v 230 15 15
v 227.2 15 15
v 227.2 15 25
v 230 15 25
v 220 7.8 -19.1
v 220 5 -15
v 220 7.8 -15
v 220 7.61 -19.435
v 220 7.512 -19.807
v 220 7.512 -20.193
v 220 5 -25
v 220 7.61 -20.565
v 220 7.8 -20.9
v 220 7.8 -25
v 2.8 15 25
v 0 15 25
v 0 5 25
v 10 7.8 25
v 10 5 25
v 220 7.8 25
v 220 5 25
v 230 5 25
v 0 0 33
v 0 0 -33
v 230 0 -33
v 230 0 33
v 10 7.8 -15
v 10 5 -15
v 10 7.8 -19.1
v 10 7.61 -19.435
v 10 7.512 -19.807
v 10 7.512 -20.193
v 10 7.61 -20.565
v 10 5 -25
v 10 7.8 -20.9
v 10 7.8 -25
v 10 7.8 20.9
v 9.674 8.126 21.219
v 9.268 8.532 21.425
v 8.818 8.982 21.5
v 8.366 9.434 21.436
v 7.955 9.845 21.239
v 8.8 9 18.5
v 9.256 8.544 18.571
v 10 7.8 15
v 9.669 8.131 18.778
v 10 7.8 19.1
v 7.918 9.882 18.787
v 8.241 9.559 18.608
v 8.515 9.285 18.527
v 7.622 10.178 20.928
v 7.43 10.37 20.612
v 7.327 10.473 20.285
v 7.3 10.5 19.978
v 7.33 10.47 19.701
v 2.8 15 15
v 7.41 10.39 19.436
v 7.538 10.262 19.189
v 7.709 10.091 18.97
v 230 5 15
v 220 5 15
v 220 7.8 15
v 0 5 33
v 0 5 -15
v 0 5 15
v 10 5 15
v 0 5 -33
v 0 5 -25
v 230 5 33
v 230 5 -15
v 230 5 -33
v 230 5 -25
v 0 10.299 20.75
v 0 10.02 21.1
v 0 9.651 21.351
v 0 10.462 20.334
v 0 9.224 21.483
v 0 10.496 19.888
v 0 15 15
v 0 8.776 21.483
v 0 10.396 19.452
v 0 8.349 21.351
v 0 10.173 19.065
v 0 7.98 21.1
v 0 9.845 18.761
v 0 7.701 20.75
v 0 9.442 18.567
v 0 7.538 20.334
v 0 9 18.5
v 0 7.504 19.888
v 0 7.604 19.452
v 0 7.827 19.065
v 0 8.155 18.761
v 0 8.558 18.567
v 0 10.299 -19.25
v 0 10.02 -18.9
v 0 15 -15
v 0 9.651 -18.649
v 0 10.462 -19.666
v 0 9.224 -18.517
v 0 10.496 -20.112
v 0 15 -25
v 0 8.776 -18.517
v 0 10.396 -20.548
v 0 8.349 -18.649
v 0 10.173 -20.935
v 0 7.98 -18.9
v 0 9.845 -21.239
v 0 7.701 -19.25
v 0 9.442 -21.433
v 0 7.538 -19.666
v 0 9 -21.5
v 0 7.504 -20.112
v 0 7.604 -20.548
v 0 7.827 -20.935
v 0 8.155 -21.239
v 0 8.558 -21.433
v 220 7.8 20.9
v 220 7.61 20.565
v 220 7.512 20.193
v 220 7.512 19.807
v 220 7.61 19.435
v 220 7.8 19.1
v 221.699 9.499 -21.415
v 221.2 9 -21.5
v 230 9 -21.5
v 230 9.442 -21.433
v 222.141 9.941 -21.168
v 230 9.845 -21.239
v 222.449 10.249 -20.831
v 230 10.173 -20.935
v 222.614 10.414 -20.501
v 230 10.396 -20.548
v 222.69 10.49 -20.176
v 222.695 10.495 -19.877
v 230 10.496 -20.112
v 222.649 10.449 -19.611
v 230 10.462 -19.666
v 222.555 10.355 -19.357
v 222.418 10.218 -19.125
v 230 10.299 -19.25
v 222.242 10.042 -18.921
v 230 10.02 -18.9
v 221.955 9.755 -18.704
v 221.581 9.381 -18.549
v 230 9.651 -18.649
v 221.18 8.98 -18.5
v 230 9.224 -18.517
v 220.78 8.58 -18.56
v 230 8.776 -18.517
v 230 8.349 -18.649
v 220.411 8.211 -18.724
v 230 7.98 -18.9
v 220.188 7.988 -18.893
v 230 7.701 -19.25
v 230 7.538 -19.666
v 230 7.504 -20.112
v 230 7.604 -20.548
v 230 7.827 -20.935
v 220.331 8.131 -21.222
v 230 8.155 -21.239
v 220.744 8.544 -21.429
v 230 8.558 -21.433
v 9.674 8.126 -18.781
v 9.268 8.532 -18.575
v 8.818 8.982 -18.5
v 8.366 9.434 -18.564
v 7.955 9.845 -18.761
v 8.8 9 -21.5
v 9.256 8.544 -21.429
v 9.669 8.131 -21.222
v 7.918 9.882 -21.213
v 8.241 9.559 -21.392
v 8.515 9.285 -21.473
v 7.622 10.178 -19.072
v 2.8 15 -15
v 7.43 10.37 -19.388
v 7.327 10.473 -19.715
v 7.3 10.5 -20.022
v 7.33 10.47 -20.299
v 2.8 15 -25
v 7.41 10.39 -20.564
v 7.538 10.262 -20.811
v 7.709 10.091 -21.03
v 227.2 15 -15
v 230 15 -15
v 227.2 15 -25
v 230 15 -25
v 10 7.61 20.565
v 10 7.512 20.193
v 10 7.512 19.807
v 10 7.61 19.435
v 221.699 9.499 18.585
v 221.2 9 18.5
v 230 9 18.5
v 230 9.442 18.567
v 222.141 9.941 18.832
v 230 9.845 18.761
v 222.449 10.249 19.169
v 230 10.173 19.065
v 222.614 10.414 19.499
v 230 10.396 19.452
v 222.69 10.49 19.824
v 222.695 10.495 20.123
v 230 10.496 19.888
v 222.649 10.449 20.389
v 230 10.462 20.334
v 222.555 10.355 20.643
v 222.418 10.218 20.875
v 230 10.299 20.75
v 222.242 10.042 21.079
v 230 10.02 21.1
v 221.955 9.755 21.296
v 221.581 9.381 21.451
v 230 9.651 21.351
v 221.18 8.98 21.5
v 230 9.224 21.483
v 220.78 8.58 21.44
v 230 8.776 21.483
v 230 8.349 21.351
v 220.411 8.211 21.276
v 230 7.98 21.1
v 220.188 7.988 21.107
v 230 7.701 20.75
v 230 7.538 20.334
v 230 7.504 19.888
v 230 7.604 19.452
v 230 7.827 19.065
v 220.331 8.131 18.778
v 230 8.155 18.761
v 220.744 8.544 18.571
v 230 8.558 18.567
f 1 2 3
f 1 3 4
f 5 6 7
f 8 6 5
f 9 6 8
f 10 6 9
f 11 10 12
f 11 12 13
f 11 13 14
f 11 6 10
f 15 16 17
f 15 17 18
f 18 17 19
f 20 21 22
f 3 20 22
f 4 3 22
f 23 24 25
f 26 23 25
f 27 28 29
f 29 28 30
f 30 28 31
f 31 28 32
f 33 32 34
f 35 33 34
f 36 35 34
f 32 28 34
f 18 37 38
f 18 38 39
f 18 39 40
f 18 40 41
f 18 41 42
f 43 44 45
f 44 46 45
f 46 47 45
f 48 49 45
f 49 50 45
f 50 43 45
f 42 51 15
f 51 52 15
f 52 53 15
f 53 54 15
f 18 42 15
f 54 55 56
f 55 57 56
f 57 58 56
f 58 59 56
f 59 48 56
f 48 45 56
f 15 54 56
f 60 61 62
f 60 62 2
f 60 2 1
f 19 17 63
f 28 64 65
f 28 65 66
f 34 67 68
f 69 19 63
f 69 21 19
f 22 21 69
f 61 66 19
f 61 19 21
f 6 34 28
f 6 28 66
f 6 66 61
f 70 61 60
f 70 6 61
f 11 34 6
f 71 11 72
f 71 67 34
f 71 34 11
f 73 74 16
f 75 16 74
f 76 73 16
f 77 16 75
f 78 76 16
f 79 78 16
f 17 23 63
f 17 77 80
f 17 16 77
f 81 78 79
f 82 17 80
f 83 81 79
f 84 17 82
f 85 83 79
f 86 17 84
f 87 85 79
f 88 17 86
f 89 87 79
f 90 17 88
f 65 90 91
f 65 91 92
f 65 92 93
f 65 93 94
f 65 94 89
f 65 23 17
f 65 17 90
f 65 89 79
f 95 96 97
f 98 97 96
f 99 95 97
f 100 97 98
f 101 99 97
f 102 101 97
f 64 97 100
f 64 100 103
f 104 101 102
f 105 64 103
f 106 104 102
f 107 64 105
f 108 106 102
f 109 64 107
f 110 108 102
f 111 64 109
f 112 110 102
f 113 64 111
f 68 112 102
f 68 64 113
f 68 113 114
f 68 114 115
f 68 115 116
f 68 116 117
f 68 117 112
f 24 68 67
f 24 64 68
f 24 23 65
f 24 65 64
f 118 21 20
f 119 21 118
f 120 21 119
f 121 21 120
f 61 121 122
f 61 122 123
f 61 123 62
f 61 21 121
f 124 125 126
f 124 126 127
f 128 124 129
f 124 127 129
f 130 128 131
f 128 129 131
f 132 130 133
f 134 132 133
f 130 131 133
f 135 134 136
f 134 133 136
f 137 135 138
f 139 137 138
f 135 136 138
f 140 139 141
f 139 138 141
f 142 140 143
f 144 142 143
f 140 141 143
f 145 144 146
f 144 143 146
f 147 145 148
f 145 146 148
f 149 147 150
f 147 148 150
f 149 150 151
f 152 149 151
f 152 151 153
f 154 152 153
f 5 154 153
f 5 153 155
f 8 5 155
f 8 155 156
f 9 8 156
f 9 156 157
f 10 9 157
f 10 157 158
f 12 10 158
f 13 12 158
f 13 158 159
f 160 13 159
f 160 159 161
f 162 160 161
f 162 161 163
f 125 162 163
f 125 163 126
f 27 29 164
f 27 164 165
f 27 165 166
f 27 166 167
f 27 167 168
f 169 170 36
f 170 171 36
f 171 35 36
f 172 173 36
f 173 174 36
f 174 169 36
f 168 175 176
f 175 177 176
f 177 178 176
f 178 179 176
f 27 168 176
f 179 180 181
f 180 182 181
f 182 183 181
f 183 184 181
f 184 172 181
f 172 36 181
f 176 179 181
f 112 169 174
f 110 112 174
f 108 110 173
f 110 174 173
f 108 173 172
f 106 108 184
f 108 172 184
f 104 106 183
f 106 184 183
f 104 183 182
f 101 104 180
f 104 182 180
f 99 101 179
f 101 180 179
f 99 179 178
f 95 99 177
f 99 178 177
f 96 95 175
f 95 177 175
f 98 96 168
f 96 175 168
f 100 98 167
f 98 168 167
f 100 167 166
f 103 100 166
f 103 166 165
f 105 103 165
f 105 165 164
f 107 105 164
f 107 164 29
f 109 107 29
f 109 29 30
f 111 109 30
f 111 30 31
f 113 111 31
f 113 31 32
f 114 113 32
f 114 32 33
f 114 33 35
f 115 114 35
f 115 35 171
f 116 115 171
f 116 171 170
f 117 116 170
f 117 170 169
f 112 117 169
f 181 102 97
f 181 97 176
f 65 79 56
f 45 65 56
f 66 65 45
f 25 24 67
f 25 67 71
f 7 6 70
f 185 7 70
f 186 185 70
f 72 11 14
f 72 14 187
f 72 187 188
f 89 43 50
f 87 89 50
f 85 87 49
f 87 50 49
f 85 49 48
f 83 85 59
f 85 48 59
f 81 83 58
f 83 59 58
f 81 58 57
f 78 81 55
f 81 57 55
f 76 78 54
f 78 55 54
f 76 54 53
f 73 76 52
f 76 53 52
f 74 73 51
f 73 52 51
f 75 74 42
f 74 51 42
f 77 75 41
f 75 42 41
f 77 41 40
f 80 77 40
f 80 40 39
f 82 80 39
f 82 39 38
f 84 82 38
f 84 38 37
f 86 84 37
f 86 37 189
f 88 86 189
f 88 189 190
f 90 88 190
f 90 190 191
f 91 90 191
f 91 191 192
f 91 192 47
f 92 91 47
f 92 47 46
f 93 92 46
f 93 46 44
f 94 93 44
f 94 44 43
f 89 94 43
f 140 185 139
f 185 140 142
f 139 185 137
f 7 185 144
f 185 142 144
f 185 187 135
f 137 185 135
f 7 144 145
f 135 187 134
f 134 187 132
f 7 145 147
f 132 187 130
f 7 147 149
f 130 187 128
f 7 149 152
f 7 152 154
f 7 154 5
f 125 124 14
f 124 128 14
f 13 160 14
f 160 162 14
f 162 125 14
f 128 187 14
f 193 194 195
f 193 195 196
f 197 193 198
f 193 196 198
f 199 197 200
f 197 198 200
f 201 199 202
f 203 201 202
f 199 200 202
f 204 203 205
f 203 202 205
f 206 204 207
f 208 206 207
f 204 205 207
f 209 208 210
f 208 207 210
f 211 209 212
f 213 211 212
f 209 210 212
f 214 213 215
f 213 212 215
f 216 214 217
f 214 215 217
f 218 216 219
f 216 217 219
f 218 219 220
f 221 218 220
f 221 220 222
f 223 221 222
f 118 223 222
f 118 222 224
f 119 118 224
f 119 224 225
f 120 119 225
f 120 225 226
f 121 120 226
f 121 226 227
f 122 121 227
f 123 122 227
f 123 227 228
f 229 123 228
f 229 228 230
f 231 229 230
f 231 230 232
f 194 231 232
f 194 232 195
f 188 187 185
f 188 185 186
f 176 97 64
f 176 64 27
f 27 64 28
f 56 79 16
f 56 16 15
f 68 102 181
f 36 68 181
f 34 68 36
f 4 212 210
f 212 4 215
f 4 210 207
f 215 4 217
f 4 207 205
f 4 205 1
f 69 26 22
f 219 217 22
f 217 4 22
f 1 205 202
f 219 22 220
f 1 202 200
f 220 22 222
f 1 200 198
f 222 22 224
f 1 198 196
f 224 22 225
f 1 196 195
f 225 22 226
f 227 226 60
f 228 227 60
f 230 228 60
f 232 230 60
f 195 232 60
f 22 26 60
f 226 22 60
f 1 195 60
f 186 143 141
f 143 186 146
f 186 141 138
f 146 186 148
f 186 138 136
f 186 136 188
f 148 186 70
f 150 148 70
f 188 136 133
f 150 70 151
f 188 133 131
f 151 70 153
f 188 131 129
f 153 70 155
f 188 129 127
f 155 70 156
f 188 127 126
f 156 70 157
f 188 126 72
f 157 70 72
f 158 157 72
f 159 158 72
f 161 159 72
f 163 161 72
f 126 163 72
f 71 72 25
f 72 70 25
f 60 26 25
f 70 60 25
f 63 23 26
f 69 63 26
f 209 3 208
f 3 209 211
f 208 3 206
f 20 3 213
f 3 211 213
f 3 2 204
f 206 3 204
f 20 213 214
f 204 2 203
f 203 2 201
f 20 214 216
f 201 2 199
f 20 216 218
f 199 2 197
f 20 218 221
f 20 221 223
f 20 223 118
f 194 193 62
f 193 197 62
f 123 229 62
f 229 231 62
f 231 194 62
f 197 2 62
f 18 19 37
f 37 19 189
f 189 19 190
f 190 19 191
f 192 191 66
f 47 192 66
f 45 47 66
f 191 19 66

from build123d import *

# Parameters (mm, degrees)
SKETCH1_W           = 230
SKETCH1_H           = 66
BOSS_EXTRUDE1_DEPTH = 5
SKETCH2_W           = 10
SKETCH2_H           = 10
BOSS_EXTRUDE2_DEPTH = 10
SKETCH3_R           = 1.5
CUT_EXTRUDE1_DEPTH  = 233.83900017
CUT_EXTRUDE2_DEPTH  = 238.67414668


with BuildPart() as part:
    # Sketch1 → Boss-Extrude1 (new body)
    with BuildSketch(Plane(origin=(0, 0, 0), x_dir=(1, 0, 0), z_dir=(0, 1, 0))):
        with Locations((115, 0)):
            Rectangle(SKETCH1_W, SKETCH1_H)
    extrude(amount=BOSS_EXTRUDE1_DEPTH)

    # Sketch2 → Boss-Extrude2 (add)
    with BuildSketch(Plane(origin=(0, 5, 0), x_dir=(1, 0, 0), z_dir=(0, 1, 0))):
        with Locations((5, -20)):
            Rectangle(SKETCH2_W, SKETCH2_H)
        with Locations((225, -20)):
            Rectangle(SKETCH2_W, SKETCH2_H)
        with Locations((225, 20)):
            Rectangle(SKETCH2_W, SKETCH2_H)
        with Locations((5, 20)):
            Rectangle(SKETCH2_W, SKETCH2_H)
    extrude(amount=BOSS_EXTRUDE2_DEPTH)

    # Sketch3 → Cut-Extrude1 (cut, through all)
    with BuildSketch(Plane(origin=(230, 0, 0), x_dir=(0, 0, -1), z_dir=(1, 0, 0))):
        with Locations((-20, 9)):
            Circle(SKETCH3_R)
        with Locations((20, 9)):
            Circle(SKETCH3_R)
    extrude(amount=-CUT_EXTRUDE1_DEPTH, mode=Mode.SUBTRACT)

    # Sketch4 → Cut-Extrude2 (cut, through all)
    with BuildSketch(Plane(origin=(0, 0, -25), x_dir=(-1, 0, 0), z_dir=(0, 0, -1))):
        Polygon((-227.2, 15), (-220, 7.8), (-220, 15), align=None)
        Polygon((-2.8, 15), (-10, 15), (-10, 7.8), align=None)
    extrude(amount=-CUT_EXTRUDE2_DEPTH, mode=Mode.SUBTRACT)


solid = part.part
